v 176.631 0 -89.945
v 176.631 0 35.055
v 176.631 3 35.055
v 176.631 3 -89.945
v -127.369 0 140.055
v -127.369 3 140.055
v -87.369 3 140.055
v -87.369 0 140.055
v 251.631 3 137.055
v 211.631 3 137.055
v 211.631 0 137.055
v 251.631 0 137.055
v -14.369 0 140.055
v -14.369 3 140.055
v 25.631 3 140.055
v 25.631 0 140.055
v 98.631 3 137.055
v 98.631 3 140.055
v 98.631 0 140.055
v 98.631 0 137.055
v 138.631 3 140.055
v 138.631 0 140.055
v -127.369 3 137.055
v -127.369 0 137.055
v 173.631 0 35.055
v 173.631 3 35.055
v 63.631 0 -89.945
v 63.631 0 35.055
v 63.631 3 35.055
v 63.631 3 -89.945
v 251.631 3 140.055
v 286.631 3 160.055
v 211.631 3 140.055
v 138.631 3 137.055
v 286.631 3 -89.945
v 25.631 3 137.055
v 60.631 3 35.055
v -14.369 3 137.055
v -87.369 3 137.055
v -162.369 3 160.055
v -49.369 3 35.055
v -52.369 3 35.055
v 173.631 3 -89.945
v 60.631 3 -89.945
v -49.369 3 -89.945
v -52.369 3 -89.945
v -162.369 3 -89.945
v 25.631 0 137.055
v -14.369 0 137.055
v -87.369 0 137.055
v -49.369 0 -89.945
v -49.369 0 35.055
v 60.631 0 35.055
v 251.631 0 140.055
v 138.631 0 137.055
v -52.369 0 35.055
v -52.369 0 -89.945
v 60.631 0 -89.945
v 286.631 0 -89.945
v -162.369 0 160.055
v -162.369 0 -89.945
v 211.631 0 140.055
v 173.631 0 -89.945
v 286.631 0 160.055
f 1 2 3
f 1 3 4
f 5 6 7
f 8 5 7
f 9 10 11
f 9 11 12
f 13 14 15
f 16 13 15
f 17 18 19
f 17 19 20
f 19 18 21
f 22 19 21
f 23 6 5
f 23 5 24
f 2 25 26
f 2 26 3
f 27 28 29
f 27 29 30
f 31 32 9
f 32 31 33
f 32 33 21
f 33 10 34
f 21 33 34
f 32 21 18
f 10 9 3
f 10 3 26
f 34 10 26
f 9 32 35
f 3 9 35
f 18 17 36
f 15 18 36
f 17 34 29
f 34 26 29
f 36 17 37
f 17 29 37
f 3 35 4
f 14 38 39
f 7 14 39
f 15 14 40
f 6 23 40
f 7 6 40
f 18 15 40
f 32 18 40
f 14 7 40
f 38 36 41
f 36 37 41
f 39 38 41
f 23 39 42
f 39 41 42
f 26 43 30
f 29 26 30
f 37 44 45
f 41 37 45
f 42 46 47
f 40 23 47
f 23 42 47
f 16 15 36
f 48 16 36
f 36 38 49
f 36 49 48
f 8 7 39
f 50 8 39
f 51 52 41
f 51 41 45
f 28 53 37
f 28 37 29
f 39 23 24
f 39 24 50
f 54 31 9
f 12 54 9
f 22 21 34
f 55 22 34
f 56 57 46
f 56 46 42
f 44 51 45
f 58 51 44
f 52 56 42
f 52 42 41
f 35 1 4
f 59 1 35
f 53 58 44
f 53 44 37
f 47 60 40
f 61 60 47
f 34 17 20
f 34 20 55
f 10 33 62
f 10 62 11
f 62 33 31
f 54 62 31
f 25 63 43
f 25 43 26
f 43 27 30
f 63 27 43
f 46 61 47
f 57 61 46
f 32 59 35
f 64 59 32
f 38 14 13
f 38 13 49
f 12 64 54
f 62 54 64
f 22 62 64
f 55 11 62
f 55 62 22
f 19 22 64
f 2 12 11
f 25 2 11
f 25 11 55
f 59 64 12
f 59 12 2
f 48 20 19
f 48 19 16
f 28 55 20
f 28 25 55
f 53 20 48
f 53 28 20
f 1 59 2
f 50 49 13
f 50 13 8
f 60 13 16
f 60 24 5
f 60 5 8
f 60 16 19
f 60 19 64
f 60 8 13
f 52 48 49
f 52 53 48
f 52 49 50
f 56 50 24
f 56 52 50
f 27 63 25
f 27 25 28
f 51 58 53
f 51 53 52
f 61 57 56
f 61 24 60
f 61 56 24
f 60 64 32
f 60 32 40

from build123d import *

# Parameters (mm, degrees)
BOSS_EXTRUDE1_DEPTH = 3
SKETCH2_W           = 40
SKETCH2_H           = 3
CUT_EXTRUDE1_DEPTH  = 3


with BuildPart() as part:
    # Sketch1 → Boss-Extrude1 (new body)
    with BuildSketch(Plane(origin=(0, 0, 0), x_dir=(1, 0, 0), z_dir=(0, 1, 0))):
        Polygon((-162.368507953, 89.945054945), (-52.368507953, 89.945054945), (-52.368507953, -35.054945055), (-49.368507953, -35.054945055), (-49.368507953, 89.945054945), (60.631492047, 89.945054945), (60.631492047, -35.054945055), (63.631492047, -35.054945055), (63.631492047, 89.945054945), (173.631492047, 89.945054945), (173.631492047, -35.054945055), (176.631492047, -35.054945055), (176.631492047, 89.945054945), (286.631492047, 89.945054945), (286.631492047, -160.054945055), (-162.368507953, -160.054945055), align=None)
    extrude(amount=BOSS_EXTRUDE1_DEPTH)

    # Sketch2 → Cut-Extrude1 (cut)
    with BuildSketch(Plane(origin=(0, 3, 0), x_dir=(1, 0, 0), z_dir=(0, 1, 0))):
        with Locations((-107.368507953, -138.554945055)):
            Rectangle(SKETCH2_W, SKETCH2_H)
        with Locations((5.631492047, -138.554945055)):
            Rectangle(SKETCH2_W, SKETCH2_H)
        with Locations((118.631492047, -138.554945055)):
            Rectangle(SKETCH2_W, SKETCH2_H)
        with Locations((231.631492047, -138.554945055)):
            Rectangle(SKETCH2_W, SKETCH2_H)
    extrude(amount=-CUT_EXTRUDE1_DEPTH, mode=Mode.SUBTRACT)


solid = part.part
